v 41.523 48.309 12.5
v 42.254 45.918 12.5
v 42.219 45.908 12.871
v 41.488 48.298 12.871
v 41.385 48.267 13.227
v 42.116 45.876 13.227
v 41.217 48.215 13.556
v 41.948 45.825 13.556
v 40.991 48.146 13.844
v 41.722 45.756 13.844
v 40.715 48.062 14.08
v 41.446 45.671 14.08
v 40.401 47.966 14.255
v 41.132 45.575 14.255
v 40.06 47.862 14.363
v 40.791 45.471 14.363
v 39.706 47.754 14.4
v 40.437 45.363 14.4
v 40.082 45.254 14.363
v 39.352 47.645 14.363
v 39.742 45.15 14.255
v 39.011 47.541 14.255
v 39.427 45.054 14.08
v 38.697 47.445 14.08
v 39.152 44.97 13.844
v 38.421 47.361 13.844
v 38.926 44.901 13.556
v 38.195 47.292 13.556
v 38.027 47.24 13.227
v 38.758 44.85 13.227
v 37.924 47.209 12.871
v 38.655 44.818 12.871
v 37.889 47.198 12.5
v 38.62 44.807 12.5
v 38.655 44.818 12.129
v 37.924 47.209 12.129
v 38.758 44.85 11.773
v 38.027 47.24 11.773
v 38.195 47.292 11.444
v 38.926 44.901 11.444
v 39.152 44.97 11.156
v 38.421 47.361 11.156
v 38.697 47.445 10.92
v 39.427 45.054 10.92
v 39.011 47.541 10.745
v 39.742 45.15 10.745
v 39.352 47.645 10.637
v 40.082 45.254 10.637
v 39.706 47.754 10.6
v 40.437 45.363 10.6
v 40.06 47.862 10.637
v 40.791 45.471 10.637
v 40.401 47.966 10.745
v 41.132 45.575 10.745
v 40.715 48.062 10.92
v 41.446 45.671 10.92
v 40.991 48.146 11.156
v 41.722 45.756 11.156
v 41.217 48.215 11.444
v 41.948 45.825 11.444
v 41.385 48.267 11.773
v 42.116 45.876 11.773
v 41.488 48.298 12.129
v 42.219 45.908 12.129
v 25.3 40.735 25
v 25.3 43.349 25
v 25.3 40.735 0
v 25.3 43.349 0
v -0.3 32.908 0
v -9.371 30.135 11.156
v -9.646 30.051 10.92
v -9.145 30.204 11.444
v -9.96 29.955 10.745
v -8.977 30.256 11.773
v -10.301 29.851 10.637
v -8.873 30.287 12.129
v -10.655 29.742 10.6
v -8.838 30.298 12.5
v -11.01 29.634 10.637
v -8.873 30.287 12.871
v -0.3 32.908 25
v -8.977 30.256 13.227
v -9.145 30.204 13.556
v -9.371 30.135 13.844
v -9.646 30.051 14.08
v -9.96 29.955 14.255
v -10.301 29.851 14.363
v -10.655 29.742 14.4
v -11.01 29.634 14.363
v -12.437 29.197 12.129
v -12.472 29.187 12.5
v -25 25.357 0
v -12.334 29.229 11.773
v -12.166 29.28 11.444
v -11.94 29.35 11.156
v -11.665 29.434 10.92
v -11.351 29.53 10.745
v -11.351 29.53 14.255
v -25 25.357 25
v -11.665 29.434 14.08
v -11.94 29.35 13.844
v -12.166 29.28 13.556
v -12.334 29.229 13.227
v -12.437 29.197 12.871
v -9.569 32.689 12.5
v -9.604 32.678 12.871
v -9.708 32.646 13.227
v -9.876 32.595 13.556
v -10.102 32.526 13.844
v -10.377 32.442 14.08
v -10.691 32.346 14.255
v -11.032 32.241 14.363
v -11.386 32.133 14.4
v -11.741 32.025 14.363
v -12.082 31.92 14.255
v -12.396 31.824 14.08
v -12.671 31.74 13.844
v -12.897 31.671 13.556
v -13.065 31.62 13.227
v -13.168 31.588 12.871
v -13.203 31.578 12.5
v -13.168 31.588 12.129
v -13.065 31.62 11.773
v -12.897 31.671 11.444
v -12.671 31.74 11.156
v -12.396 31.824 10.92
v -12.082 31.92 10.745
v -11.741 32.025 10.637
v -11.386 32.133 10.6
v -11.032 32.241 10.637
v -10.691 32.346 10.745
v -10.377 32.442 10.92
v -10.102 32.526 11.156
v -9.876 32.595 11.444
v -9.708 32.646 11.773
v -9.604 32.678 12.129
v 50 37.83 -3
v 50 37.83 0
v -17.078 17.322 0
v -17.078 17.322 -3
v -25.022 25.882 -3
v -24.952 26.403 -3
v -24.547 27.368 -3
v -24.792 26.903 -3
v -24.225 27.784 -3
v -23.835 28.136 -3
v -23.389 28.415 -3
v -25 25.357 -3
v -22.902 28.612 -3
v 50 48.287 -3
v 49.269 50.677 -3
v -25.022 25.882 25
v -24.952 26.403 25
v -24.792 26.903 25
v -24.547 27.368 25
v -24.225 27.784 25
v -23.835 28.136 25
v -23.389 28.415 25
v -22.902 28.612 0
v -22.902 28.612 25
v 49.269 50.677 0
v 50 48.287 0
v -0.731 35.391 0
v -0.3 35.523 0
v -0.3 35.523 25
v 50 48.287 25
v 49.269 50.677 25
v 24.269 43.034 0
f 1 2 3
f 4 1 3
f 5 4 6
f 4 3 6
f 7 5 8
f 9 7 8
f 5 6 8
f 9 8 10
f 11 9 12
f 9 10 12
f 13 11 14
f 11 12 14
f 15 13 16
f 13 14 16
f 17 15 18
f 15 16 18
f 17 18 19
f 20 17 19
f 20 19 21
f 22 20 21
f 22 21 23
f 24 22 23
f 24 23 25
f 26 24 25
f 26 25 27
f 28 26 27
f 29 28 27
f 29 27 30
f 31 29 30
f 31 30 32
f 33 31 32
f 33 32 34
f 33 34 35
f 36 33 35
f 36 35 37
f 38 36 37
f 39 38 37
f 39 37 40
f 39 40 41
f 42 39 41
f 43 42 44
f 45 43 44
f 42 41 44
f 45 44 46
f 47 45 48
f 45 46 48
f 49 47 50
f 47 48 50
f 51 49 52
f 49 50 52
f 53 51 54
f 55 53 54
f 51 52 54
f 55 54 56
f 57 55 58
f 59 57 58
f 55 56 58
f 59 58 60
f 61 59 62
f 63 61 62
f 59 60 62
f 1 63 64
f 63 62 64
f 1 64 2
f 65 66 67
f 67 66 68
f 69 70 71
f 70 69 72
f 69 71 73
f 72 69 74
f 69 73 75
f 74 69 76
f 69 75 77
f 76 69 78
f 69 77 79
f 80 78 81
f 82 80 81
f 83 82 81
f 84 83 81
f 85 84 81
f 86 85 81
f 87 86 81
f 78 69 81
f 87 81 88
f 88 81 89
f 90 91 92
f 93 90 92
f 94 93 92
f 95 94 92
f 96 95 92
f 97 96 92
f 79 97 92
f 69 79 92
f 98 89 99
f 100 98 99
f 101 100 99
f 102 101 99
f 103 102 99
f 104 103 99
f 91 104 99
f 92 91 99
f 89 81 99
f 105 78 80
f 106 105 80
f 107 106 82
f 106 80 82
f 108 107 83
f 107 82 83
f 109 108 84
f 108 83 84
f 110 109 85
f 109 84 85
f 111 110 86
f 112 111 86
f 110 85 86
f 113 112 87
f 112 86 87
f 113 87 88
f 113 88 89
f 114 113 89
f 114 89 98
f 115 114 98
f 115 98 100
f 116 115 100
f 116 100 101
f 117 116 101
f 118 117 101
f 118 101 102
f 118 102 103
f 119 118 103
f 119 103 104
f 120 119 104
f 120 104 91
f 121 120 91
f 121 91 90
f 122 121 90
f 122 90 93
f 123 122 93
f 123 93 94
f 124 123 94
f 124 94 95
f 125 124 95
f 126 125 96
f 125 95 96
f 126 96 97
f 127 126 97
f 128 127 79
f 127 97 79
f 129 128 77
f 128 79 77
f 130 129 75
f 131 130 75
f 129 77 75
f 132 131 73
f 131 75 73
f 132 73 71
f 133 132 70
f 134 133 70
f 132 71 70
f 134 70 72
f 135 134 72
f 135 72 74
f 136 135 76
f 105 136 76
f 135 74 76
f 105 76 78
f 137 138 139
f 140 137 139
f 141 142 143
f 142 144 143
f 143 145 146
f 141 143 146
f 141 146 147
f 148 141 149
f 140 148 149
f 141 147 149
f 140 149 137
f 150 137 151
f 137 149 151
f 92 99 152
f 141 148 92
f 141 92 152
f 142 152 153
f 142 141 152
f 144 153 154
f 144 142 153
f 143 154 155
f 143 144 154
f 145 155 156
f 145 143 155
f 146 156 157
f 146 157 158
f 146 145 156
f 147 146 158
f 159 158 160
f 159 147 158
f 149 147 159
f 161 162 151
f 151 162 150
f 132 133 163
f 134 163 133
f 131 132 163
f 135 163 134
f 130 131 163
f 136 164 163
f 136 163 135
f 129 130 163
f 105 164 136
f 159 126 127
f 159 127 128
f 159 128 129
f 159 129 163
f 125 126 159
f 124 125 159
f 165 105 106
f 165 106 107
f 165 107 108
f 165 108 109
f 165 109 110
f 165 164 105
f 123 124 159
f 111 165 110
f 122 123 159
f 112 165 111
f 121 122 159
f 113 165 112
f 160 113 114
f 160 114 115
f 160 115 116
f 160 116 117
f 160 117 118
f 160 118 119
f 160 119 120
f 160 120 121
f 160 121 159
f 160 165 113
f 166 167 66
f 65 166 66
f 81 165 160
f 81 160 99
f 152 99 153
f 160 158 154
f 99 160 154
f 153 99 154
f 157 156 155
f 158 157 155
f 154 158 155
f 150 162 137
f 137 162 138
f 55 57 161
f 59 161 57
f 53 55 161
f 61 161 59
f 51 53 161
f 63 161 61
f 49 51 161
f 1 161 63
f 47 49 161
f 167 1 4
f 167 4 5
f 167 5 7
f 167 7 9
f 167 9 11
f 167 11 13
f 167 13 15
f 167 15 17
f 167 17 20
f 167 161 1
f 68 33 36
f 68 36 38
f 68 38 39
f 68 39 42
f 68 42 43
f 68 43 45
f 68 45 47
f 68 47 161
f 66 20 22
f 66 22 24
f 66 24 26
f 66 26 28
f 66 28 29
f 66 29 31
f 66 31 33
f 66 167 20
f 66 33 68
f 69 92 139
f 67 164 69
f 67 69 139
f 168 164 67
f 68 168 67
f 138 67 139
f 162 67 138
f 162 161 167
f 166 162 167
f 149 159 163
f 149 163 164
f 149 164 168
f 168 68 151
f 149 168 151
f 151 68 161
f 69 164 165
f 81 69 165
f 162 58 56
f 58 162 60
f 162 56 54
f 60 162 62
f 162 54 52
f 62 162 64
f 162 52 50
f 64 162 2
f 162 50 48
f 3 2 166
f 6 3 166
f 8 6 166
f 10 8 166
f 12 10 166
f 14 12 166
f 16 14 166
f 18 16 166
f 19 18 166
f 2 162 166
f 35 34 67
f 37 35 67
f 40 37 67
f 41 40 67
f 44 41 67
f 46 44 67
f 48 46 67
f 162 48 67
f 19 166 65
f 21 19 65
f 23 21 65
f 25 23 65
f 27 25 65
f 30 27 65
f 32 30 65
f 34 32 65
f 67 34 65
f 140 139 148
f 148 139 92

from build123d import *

# Parameters (mm, degrees)
F0_W         = 25
F0_H         = 33
F1_DEPTH     = 25
F3_DEPTH     = 10
F5_DEPTH     = 81.7
F7_DEPTH     = 10
F9_DEPTH     = 92
F10_W        = 13
F10_H        = 13
F11_DEPTH    = 40
F12_R        = 1.9
F13_DEPTH    = 7
F15_DEPTH    = 2.5
F16_W        = 78.4268817365
F16_H        = 25
F17_DEPTH    = 2.5
F19_DEPTH    = 336
F21_DEPTH    = 25
F23_W        = 90.9570492804
F23_H        = 10.3441323154
F24_DEPTH    = 48.1
F26_DEPTH    = 199
F27_W        = 183.3121031523
F27_H        = 83.9067064226
F28_DEPTH    = 179
F29_T1_DEPTH = 32.3950995948
F29_T3_DEPTH = 10.395099863
F31_DEPTH    = 25
F32_R        = 1.9
F33_DEPTH    = 25


# Not quite as in the source:
# - a fillet or chamfer that OpenCascade refuses, or shapes differently, is made with other operations: its cross-section is extruded or revolved along the edge and cut away or added


with BuildPart() as f1:
    # F0 (on Top) → F1 (new body)
    with BuildSketch(Plane.XY):
        with Locations((12.5, 16.5)):
            Rectangle(F0_W, F0_H)
        Polygon((-25, 25.3567329635), (0, 0), (0, 33), align=None)
        with Locations((37.5, 16.5)):
            Rectangle(F0_W, F0_H)
        Polygon((25, 40.6432670365), (0, 33), (25, 33), align=None)
        Polygon((0, 101.4598330308), (0, 33), (25, 40.6432670365), (25, 101.4598330308), (25, 137), (0, 137), align=None)
        Polygon((25, 40.6432670365), (25, 33), (50, 33), (50, 48.2865340729), align=None)
        Polygon((-25, 131.6860859582), (0, 101.4598330308), (0, 137), align=None)
        Polygon((25, 137), (25, 101.4598330308), (50, 131.6860859582), (50, 147.6278280835), (25, 142.3139140418), align=None)
        Polygon((25, 142.3139140418), (0, 137), (25, 137), align=None)
        Polygon((0, 177), (0, 137), (25, 142.3139140418), (25, 177), align=None)
    extrude(amount=F1_DEPTH)

    # F2 (on face) → F3 (join)
    with BuildSketch(Plane(origin=(0, 0, 0), x_dir=(1, 0, 0), z_dir=(0, 0, -1))):
        Polygon((50, -131.6860859582), (25, -101.4598330308), (0, -101.4598330308), (-25, -131.6860859582), (50, -147.6278280835), align=None)
    extrude(amount=F3_DEPTH)

    # F4 (on face) → F5 (cut, symmetric)
    with BuildSketch(Plane.YZ.offset(25)):
        Polygon((101.4598330308, -21.1370438337), (147.6278330308, -10), (101.4598330308, 0), align=None)
    extrude(amount=F5_DEPTH, both=True, mode=Mode.SUBTRACT)

    # F6 (on face) → F7 (join)
    with BuildSketch(Plane(origin=(0, 0, 0), x_dir=(1, 0, 0), z_dir=(0, 0, -1))):
        Polygon((50, -48.2865340729), (50, 0), (0, 0), (-25, -25.3567329635), align=None)
    extrude(amount=F7_DEPTH)

    # F8 (on face) → F9 (cut)
    with BuildSketch(Plane.YZ.offset(50)):
        Polygon((48.2865340729, -10), (0, 0), (0, -39.534393698), (48.2865340729, -39.534393698), align=None)
    extrude(amount=-F9_DEPTH, mode=Mode.SUBTRACT)

    # F10 (on face) → F11 (cut)
    with BuildSketch(Plane(origin=(0, 177, 0), x_dir=(-1, 0, 0), z_dir=(0, 1, 0))):
        with Locations((-12.5, 12.5)):
            Rectangle(F10_W, F10_H)
    extrude(amount=-F11_DEPTH, mode=Mode.SUBTRACT)

    # F12 (on face) → F13 (cut)
    with BuildSketch(Plane(origin=(-27.8614600507, 131.0778638485, 0), x_dir=(-0.9781476007, -0.2079116908, 0), z_dir=(-0.2079116908, 0.9781476007, 0))):
        with Locations((-18.6253867704, 12.5)):
            Circle(F12_R)
        with BuildLine():
            ThreePointArc((-72.2009313853, 12.5), (-70.3009313853, 10.6), (-68.4009313853, 12.5))
            ThreePointArc((-68.4009313853, 12.5), (-70.3009313853, 14.4), (-72.2009313853, 12.5))
        make_face()
    extrude(amount=-F13_DEPTH, mode=Mode.SUBTRACT)

    # F15 (add): a face of the model
    f15_faces = [f1.faces().sort_by_distance(p)[0] for p in [
        (12.5, 36.8216335182, -0.8588233683),
    ]]
    extrude(f15_faces, amount=F15_DEPTH)

    # F16 (on face) → F17 (join)
    with BuildSketch(Plane(origin=(-9.9576121691, 32.5698818371, 0), x_dir=(-0.956304756, -0.2923717047, 0), z_dir=(-0.2923717047, 0.956304756, 0))):
        with Locations((-22.7194132119, 12.5)):
            Rectangle(F16_W, F16_H)
    extrude(amount=-F17_DEPTH)

    # F18 (on face) → F19 (cut)
    with BuildSketch(Plane(origin=(-9.9576121691, 32.5698818371, 0), x_dir=(-0.956304756, -0.2923717047, 0), z_dir=(-0.2923717047, 0.956304756, 0))):
        Polygon((16.4940276563, -15.7148446888), (16.4940276563, -3), (-61.9328540802, -3), (-74.3611752987, -3), (-74.3611752987, -15.7148446888), align=None)
    extrude(amount=-F19_DEPTH, mode=Mode.SUBTRACT)

    # F20 (on face) → F21 (cut)
    with BuildSketch(Plane.XY.offset(25)):
        Polygon((50, 48.2865340729), (-25, 25.3567329635), (-20.5921567976, -5.8456440456), (63.7660473585, -9.7692795098), align=None)
    extrude(amount=-F21_DEPTH, mode=Mode.SUBTRACT)

    # F23 (on offset) → F24 (cut)
    with BuildSketch(Plane(origin=(-6.30296586, 20.6160723875, 0), x_dir=(-0.956304756, -0.2923717047, 0), z_dir=(-0.2923717047, 0.956304756, 0))):
        with Locations((-20.5792468041, -2.5766163599)):
            Rectangle(F23_W, F23_H)
    extrude(amount=-F24_DEPTH, mode=Mode.SUBTRACT)

    # F25 (on face) → F26 (cut)
    with BuildSketch(Plane(origin=(0, 177, 0), x_dir=(-1, 0, 0), z_dir=(0, 1, 0))):
        Polygon((0.3, 25), (0, 25), (-25, 25), (-25.3, 25), (-25.3, 0), (-25, 0), (0, 0), (0.3, 0), align=None)
    extrude(amount=-F26_DEPTH, mode=Mode.SUBTRACT)

    # F27 (on face) → F28 (cut)
    with BuildSketch(Plane(origin=(-9.9576121691, 32.5698818371, 0), x_dir=(-0.956304756, -0.2923717047, 0), z_dir=(-0.2923717047, 0.956304756, 0))):
        with Locations((-51.5790507197, 11.8016507477)):
            Rectangle(F27_W, F27_H)
    extrude(amount=F28_DEPTH, mode=Mode.SUBTRACT)

    # F29: fillet of radius 3 on 1 edges, made by hand

    # F29_s2 → F29_t1 (cut)
    with BuildSketch(Plane.XY.offset(1.341e-07)):
        with BuildLine():
            ThreePointArc((-25, 25.3567329635), (-24.5468104619, 27.3684218455), (-22.9021416452, 28.6123420192))
            Line((-22.9021416452, 28.6123420192), (-25.7309292618, 27.7474948534))
            Line((-25.7309292618, 27.7474948534), (-25, 25.3567329635))
        make_face()
    extrude(amount=F29_T1_DEPTH, mode=Mode.SUBTRACT)

    # F29_s4 → F29_t3 (cut)
    with BuildSketch(Plane.XY.offset(-10.3950997289)):
        with BuildLine():
            ThreePointArc((-25, 25.3567329635), (-24.5468104619, 27.3684218455), (-22.9021416452, 28.6123420192))
            Line((-22.9021416452, 28.6123420192), (-25.7309292618, 27.7474948534))
            Line((-25.7309292618, 27.7474948534), (-25, 25.3567329635))
        make_face()
    extrude(amount=F29_T3_DEPTH, mode=Mode.SUBTRACT)

    # F30 (on face) → F31 (cut)
    with BuildSketch(Plane(origin=(-9.2266829073, 30.1791199472, 0), x_dir=(0.956304756, 0.2923717047, 0), z_dir=(0.2923717047, -0.956304756, 0))):
        with BuildLine():
            ThreePointArc((-3.3940276563, 12.5), (-1.4940276563, 10.6), (0.4059723437, 12.5))
            ThreePointArc((0.4059723437, 12.5), (-1.4940276563, 14.4), (-3.3940276563, 12.5))
        make_face()
    extrude(amount=-F31_DEPTH, mode=Mode.SUBTRACT)

    # F32 (on face) → F33 (cut)
    with BuildSketch(Plane(origin=(-9.2266829073, 30.1791199472, 0), x_dir=(0.956304756, 0.2923717047, 0), z_dir=(0.2923717047, -0.956304756, 0))):
        with Locations((51.9328540802, 12.5)):
            Circle(F32_R)
    extrude(amount=-F33_DEPTH, mode=Mode.SUBTRACT)


solid = f1.part
